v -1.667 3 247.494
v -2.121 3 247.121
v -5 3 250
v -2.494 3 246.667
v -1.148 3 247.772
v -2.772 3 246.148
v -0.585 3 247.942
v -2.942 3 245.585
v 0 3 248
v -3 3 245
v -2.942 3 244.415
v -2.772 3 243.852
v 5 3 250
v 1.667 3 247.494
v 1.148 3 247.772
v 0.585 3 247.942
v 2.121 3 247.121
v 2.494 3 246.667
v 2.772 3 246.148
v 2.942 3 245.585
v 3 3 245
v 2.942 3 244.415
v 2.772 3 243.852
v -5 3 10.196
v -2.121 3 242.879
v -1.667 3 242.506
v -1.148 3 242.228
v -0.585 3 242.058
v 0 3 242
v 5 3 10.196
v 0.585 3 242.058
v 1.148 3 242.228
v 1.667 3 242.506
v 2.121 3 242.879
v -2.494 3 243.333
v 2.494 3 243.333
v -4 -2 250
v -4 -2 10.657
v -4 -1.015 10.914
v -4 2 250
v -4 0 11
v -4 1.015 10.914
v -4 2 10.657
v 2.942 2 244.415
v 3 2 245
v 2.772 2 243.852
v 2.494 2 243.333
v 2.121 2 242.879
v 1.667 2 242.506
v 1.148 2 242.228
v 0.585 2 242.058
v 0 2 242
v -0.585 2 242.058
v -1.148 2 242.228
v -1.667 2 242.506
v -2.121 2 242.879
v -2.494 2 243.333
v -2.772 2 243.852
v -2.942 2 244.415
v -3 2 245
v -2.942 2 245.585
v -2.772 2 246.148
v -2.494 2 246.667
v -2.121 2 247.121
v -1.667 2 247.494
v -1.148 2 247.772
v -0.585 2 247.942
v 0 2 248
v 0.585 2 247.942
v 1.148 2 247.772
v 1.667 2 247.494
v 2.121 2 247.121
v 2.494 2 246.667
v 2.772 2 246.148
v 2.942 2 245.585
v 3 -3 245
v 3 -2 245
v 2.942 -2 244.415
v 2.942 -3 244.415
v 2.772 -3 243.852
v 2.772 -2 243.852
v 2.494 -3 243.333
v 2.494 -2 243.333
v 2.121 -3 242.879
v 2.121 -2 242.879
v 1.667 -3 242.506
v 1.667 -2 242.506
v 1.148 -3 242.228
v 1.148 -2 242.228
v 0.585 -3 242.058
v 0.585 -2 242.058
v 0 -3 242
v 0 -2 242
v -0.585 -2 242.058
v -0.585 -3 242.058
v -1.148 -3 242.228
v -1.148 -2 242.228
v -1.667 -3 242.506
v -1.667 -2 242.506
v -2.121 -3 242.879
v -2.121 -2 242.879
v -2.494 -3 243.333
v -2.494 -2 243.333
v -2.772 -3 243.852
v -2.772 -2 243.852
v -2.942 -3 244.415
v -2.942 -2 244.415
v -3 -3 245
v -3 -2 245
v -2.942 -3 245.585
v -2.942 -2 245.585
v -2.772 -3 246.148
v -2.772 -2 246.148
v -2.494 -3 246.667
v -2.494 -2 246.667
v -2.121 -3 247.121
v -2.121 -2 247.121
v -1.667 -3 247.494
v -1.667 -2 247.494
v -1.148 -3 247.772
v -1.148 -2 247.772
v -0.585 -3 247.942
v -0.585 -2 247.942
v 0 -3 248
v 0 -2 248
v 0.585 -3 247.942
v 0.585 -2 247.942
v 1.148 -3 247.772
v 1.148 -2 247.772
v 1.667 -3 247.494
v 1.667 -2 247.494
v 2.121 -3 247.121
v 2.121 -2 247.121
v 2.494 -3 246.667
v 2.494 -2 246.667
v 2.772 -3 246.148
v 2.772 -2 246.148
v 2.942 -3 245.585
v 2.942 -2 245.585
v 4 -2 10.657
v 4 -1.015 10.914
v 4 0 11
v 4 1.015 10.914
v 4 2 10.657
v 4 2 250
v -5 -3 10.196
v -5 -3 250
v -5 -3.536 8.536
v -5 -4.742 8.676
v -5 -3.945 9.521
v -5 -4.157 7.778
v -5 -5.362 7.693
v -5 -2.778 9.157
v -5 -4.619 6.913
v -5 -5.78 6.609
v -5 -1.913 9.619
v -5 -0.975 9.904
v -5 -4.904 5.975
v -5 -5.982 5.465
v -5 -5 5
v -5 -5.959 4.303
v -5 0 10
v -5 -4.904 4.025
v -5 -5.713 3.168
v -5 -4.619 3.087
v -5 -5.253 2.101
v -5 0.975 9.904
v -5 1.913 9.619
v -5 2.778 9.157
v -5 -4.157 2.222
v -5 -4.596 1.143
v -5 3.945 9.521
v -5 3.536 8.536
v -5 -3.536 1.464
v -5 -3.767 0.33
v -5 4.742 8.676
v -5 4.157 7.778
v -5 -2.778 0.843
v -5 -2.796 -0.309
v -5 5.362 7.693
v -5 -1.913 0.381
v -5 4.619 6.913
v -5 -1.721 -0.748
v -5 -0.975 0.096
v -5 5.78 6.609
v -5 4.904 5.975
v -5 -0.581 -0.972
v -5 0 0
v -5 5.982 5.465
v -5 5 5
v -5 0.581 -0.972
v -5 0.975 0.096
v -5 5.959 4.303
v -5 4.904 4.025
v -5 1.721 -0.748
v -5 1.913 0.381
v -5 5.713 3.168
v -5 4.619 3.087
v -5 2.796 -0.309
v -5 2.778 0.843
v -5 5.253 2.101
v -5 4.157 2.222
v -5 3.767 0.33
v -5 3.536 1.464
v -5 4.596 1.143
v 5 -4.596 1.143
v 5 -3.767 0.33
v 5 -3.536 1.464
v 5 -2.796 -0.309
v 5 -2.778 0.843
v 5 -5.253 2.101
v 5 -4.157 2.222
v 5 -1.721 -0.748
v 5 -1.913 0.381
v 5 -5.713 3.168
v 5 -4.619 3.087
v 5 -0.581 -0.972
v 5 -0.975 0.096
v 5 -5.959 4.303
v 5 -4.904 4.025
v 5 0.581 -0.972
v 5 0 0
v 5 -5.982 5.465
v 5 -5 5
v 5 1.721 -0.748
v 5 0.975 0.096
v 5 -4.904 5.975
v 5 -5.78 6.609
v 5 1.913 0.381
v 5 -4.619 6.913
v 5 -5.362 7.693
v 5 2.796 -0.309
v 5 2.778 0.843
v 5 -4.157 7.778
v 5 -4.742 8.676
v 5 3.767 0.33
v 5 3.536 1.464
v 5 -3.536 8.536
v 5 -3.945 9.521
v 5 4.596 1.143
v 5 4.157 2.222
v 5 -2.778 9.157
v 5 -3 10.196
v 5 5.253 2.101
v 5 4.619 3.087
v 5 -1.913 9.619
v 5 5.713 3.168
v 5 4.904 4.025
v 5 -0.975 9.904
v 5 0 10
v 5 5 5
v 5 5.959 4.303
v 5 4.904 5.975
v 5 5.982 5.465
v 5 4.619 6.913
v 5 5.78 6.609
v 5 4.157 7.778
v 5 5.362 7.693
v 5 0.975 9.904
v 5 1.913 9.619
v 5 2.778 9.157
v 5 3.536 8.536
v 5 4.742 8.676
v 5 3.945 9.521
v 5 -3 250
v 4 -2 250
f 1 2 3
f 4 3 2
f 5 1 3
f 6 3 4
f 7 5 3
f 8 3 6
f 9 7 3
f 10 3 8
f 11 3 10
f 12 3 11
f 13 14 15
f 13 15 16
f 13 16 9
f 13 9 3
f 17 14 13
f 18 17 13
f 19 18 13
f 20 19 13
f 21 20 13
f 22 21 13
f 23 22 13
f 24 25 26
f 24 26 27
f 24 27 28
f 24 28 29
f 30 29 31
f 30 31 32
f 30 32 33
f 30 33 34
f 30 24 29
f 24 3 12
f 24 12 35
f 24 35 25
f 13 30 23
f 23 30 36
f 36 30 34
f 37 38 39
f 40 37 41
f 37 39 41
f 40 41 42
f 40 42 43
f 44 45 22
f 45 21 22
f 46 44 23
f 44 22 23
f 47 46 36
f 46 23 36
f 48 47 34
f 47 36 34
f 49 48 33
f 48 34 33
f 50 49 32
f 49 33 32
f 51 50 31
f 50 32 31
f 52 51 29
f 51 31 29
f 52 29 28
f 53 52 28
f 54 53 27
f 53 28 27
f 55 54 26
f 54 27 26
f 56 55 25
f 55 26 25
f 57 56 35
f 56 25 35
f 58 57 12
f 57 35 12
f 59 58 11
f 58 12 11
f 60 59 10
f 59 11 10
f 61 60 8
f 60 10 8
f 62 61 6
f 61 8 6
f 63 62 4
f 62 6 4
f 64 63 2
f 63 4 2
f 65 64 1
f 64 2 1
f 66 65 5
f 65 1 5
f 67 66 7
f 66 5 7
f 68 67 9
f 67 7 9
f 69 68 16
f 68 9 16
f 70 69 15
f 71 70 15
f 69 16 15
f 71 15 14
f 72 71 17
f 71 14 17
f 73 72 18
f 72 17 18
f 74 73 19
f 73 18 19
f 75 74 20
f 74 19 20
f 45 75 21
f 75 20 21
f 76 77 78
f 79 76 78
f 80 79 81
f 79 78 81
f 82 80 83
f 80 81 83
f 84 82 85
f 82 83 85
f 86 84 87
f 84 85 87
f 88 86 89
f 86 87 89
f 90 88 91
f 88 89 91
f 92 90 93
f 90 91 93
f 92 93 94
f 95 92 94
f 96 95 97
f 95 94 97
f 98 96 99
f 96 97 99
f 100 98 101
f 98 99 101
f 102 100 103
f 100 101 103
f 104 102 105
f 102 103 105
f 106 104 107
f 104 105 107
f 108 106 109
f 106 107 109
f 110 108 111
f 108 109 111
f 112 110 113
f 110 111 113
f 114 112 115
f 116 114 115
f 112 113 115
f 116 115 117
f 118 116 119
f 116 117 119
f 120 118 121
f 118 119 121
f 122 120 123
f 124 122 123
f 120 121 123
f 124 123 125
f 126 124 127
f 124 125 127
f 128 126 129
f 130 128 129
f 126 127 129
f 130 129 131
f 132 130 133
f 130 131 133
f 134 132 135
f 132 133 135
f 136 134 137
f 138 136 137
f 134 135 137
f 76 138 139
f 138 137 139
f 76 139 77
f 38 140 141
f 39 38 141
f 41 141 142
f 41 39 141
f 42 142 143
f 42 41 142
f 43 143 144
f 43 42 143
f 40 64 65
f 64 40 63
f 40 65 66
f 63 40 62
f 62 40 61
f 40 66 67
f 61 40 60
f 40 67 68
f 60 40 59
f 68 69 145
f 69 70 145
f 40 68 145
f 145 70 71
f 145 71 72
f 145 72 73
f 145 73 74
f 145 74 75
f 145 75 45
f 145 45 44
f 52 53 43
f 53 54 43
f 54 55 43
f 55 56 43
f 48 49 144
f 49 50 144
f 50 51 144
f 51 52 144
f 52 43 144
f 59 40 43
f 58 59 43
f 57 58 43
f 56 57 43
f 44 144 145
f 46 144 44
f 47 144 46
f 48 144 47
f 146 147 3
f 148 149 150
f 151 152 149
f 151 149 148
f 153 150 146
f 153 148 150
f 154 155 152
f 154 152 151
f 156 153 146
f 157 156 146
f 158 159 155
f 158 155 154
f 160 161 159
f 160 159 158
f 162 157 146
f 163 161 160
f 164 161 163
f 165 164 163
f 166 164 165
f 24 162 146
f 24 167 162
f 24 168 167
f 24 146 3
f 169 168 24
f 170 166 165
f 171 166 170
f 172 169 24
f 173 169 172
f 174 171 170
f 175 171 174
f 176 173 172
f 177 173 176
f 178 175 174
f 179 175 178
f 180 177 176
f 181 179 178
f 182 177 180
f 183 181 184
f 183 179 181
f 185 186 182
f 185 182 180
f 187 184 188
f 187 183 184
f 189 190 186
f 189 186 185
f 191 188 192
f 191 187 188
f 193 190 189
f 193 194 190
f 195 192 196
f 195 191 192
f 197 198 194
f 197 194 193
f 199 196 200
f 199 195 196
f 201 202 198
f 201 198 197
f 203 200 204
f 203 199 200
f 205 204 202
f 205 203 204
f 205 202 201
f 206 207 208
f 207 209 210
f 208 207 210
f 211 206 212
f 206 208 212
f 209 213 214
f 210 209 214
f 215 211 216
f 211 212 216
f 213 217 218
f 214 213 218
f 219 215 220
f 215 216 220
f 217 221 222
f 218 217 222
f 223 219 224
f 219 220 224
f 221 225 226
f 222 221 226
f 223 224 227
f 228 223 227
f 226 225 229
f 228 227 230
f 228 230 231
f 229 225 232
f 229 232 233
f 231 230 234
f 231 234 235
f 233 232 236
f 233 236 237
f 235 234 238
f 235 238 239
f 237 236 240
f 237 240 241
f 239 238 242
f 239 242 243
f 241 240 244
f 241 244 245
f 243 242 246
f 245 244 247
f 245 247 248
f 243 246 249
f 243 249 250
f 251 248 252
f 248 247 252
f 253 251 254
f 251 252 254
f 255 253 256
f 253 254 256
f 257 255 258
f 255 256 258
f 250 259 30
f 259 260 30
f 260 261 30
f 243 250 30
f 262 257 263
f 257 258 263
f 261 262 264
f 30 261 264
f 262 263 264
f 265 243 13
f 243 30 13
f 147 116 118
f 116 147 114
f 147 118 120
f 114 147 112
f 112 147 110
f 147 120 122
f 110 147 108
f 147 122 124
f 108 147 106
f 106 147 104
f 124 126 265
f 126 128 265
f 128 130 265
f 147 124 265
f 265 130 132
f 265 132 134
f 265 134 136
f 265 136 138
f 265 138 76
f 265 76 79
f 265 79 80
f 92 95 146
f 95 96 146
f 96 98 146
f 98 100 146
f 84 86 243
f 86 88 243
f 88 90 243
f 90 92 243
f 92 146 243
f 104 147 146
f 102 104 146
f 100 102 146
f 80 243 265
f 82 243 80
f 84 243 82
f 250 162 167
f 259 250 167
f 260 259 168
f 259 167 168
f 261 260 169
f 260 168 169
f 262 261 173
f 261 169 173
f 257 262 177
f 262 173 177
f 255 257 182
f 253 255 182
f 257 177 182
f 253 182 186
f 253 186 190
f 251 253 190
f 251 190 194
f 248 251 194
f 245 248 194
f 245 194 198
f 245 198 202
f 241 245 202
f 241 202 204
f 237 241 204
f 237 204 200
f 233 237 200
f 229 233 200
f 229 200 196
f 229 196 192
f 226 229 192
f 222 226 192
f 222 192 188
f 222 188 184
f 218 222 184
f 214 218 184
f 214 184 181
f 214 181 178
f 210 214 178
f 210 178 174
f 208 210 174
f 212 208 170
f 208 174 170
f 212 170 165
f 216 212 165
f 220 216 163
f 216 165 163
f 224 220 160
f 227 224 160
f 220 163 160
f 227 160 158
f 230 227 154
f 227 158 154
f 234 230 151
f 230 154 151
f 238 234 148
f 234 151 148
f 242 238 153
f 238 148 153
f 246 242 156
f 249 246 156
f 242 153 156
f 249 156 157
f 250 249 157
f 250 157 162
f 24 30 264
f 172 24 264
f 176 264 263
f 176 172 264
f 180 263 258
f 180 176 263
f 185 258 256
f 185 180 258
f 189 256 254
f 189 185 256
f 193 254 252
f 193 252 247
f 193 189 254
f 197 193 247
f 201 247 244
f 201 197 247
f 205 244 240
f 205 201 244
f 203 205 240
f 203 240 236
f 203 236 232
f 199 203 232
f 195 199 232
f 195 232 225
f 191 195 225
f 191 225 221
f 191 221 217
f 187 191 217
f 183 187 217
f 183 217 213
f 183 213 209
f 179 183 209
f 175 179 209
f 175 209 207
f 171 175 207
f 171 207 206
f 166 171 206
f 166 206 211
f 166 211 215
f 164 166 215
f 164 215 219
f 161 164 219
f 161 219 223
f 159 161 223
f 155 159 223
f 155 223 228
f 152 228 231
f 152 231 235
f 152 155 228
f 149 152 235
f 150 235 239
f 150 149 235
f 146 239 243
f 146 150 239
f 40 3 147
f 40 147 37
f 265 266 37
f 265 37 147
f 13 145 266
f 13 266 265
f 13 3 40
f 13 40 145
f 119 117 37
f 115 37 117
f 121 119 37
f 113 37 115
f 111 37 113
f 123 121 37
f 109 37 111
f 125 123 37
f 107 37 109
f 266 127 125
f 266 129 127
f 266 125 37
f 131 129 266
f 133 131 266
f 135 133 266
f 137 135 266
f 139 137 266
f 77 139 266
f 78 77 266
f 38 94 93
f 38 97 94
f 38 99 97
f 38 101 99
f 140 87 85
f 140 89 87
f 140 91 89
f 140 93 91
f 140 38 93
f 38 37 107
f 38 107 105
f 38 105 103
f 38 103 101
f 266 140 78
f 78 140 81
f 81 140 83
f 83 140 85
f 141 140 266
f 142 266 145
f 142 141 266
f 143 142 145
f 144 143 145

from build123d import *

# Parameters (mm, degrees)
SKETCH1_W               = 10
SKETCH1_H               = 6
BOSS_EXTRUDE1_DEPTH     = 250
SKETCH3_R               = 3
CUT_EXTRUDE2_DEPTH      = 249
CUT_EXTRUDE2_DEPTH_BACK = 249
SKETCH2_W               = 8
SKETCH2_H               = 4
CUT_EXTRUDE4_DEPTH      = 251
CUT_EXTRUDE4_DEPTH_BACK = 1
SKETCH7_R               = 6
BOSS_EXTRUDE2_DEPTH     = 10
SKETCH9_R               = 5
CUT_EXTRUDE7_DEPTH      = 1
CUT_EXTRUDE7_DEPTH_BACK = 11


with BuildPart() as part:
    # Sketch1 → Boss-Extrude1 (new body)
    with BuildSketch(Plane.XY):
        Rectangle(SKETCH1_W, SKETCH1_H)
    extrude(amount=BOSS_EXTRUDE1_DEPTH)

    # Sketch3 → Cut-Extrude2 (cut, two sides)
    with BuildSketch(Plane(origin=(0, 0, 0), x_dir=(1, 0, 0), z_dir=(0, 1, 0))) as cut_extrude2_sk:
        with Locations((0, -245)):
            Circle(SKETCH3_R)
    extrude(amount=CUT_EXTRUDE2_DEPTH, mode=Mode.SUBTRACT)
    extrude(cut_extrude2_sk.sketch, amount=-CUT_EXTRUDE2_DEPTH_BACK, mode=Mode.SUBTRACT)

    # Sketch2 → Cut-Extrude4 (cut, two sides)
    with BuildSketch(Plane.XY) as cut_extrude4_sk:
        Rectangle(SKETCH2_W, SKETCH2_H)
    extrude(amount=CUT_EXTRUDE4_DEPTH, mode=Mode.SUBTRACT)
    extrude(cut_extrude4_sk.sketch, amount=-CUT_EXTRUDE4_DEPTH_BACK, mode=Mode.SUBTRACT)

    # Sketch7 → Boss-Extrude2 (add)
    with BuildSketch(Plane.ZY.offset(5)):
        with Locations((5, 0)):
            Circle(SKETCH7_R)
    extrude(amount=-BOSS_EXTRUDE2_DEPTH)

    # Sketch9 → Cut-Extrude7 (cut, two sides)
    with BuildSketch(Plane.ZY.offset(5)) as cut_extrude7_sk:
        with Locations((5, 0)):
            Circle(SKETCH9_R)
    extrude(amount=CUT_EXTRUDE7_DEPTH, mode=Mode.SUBTRACT)
    extrude(cut_extrude7_sk.sketch, amount=-CUT_EXTRUDE7_DEPTH_BACK, mode=Mode.SUBTRACT)


solid = part.part
